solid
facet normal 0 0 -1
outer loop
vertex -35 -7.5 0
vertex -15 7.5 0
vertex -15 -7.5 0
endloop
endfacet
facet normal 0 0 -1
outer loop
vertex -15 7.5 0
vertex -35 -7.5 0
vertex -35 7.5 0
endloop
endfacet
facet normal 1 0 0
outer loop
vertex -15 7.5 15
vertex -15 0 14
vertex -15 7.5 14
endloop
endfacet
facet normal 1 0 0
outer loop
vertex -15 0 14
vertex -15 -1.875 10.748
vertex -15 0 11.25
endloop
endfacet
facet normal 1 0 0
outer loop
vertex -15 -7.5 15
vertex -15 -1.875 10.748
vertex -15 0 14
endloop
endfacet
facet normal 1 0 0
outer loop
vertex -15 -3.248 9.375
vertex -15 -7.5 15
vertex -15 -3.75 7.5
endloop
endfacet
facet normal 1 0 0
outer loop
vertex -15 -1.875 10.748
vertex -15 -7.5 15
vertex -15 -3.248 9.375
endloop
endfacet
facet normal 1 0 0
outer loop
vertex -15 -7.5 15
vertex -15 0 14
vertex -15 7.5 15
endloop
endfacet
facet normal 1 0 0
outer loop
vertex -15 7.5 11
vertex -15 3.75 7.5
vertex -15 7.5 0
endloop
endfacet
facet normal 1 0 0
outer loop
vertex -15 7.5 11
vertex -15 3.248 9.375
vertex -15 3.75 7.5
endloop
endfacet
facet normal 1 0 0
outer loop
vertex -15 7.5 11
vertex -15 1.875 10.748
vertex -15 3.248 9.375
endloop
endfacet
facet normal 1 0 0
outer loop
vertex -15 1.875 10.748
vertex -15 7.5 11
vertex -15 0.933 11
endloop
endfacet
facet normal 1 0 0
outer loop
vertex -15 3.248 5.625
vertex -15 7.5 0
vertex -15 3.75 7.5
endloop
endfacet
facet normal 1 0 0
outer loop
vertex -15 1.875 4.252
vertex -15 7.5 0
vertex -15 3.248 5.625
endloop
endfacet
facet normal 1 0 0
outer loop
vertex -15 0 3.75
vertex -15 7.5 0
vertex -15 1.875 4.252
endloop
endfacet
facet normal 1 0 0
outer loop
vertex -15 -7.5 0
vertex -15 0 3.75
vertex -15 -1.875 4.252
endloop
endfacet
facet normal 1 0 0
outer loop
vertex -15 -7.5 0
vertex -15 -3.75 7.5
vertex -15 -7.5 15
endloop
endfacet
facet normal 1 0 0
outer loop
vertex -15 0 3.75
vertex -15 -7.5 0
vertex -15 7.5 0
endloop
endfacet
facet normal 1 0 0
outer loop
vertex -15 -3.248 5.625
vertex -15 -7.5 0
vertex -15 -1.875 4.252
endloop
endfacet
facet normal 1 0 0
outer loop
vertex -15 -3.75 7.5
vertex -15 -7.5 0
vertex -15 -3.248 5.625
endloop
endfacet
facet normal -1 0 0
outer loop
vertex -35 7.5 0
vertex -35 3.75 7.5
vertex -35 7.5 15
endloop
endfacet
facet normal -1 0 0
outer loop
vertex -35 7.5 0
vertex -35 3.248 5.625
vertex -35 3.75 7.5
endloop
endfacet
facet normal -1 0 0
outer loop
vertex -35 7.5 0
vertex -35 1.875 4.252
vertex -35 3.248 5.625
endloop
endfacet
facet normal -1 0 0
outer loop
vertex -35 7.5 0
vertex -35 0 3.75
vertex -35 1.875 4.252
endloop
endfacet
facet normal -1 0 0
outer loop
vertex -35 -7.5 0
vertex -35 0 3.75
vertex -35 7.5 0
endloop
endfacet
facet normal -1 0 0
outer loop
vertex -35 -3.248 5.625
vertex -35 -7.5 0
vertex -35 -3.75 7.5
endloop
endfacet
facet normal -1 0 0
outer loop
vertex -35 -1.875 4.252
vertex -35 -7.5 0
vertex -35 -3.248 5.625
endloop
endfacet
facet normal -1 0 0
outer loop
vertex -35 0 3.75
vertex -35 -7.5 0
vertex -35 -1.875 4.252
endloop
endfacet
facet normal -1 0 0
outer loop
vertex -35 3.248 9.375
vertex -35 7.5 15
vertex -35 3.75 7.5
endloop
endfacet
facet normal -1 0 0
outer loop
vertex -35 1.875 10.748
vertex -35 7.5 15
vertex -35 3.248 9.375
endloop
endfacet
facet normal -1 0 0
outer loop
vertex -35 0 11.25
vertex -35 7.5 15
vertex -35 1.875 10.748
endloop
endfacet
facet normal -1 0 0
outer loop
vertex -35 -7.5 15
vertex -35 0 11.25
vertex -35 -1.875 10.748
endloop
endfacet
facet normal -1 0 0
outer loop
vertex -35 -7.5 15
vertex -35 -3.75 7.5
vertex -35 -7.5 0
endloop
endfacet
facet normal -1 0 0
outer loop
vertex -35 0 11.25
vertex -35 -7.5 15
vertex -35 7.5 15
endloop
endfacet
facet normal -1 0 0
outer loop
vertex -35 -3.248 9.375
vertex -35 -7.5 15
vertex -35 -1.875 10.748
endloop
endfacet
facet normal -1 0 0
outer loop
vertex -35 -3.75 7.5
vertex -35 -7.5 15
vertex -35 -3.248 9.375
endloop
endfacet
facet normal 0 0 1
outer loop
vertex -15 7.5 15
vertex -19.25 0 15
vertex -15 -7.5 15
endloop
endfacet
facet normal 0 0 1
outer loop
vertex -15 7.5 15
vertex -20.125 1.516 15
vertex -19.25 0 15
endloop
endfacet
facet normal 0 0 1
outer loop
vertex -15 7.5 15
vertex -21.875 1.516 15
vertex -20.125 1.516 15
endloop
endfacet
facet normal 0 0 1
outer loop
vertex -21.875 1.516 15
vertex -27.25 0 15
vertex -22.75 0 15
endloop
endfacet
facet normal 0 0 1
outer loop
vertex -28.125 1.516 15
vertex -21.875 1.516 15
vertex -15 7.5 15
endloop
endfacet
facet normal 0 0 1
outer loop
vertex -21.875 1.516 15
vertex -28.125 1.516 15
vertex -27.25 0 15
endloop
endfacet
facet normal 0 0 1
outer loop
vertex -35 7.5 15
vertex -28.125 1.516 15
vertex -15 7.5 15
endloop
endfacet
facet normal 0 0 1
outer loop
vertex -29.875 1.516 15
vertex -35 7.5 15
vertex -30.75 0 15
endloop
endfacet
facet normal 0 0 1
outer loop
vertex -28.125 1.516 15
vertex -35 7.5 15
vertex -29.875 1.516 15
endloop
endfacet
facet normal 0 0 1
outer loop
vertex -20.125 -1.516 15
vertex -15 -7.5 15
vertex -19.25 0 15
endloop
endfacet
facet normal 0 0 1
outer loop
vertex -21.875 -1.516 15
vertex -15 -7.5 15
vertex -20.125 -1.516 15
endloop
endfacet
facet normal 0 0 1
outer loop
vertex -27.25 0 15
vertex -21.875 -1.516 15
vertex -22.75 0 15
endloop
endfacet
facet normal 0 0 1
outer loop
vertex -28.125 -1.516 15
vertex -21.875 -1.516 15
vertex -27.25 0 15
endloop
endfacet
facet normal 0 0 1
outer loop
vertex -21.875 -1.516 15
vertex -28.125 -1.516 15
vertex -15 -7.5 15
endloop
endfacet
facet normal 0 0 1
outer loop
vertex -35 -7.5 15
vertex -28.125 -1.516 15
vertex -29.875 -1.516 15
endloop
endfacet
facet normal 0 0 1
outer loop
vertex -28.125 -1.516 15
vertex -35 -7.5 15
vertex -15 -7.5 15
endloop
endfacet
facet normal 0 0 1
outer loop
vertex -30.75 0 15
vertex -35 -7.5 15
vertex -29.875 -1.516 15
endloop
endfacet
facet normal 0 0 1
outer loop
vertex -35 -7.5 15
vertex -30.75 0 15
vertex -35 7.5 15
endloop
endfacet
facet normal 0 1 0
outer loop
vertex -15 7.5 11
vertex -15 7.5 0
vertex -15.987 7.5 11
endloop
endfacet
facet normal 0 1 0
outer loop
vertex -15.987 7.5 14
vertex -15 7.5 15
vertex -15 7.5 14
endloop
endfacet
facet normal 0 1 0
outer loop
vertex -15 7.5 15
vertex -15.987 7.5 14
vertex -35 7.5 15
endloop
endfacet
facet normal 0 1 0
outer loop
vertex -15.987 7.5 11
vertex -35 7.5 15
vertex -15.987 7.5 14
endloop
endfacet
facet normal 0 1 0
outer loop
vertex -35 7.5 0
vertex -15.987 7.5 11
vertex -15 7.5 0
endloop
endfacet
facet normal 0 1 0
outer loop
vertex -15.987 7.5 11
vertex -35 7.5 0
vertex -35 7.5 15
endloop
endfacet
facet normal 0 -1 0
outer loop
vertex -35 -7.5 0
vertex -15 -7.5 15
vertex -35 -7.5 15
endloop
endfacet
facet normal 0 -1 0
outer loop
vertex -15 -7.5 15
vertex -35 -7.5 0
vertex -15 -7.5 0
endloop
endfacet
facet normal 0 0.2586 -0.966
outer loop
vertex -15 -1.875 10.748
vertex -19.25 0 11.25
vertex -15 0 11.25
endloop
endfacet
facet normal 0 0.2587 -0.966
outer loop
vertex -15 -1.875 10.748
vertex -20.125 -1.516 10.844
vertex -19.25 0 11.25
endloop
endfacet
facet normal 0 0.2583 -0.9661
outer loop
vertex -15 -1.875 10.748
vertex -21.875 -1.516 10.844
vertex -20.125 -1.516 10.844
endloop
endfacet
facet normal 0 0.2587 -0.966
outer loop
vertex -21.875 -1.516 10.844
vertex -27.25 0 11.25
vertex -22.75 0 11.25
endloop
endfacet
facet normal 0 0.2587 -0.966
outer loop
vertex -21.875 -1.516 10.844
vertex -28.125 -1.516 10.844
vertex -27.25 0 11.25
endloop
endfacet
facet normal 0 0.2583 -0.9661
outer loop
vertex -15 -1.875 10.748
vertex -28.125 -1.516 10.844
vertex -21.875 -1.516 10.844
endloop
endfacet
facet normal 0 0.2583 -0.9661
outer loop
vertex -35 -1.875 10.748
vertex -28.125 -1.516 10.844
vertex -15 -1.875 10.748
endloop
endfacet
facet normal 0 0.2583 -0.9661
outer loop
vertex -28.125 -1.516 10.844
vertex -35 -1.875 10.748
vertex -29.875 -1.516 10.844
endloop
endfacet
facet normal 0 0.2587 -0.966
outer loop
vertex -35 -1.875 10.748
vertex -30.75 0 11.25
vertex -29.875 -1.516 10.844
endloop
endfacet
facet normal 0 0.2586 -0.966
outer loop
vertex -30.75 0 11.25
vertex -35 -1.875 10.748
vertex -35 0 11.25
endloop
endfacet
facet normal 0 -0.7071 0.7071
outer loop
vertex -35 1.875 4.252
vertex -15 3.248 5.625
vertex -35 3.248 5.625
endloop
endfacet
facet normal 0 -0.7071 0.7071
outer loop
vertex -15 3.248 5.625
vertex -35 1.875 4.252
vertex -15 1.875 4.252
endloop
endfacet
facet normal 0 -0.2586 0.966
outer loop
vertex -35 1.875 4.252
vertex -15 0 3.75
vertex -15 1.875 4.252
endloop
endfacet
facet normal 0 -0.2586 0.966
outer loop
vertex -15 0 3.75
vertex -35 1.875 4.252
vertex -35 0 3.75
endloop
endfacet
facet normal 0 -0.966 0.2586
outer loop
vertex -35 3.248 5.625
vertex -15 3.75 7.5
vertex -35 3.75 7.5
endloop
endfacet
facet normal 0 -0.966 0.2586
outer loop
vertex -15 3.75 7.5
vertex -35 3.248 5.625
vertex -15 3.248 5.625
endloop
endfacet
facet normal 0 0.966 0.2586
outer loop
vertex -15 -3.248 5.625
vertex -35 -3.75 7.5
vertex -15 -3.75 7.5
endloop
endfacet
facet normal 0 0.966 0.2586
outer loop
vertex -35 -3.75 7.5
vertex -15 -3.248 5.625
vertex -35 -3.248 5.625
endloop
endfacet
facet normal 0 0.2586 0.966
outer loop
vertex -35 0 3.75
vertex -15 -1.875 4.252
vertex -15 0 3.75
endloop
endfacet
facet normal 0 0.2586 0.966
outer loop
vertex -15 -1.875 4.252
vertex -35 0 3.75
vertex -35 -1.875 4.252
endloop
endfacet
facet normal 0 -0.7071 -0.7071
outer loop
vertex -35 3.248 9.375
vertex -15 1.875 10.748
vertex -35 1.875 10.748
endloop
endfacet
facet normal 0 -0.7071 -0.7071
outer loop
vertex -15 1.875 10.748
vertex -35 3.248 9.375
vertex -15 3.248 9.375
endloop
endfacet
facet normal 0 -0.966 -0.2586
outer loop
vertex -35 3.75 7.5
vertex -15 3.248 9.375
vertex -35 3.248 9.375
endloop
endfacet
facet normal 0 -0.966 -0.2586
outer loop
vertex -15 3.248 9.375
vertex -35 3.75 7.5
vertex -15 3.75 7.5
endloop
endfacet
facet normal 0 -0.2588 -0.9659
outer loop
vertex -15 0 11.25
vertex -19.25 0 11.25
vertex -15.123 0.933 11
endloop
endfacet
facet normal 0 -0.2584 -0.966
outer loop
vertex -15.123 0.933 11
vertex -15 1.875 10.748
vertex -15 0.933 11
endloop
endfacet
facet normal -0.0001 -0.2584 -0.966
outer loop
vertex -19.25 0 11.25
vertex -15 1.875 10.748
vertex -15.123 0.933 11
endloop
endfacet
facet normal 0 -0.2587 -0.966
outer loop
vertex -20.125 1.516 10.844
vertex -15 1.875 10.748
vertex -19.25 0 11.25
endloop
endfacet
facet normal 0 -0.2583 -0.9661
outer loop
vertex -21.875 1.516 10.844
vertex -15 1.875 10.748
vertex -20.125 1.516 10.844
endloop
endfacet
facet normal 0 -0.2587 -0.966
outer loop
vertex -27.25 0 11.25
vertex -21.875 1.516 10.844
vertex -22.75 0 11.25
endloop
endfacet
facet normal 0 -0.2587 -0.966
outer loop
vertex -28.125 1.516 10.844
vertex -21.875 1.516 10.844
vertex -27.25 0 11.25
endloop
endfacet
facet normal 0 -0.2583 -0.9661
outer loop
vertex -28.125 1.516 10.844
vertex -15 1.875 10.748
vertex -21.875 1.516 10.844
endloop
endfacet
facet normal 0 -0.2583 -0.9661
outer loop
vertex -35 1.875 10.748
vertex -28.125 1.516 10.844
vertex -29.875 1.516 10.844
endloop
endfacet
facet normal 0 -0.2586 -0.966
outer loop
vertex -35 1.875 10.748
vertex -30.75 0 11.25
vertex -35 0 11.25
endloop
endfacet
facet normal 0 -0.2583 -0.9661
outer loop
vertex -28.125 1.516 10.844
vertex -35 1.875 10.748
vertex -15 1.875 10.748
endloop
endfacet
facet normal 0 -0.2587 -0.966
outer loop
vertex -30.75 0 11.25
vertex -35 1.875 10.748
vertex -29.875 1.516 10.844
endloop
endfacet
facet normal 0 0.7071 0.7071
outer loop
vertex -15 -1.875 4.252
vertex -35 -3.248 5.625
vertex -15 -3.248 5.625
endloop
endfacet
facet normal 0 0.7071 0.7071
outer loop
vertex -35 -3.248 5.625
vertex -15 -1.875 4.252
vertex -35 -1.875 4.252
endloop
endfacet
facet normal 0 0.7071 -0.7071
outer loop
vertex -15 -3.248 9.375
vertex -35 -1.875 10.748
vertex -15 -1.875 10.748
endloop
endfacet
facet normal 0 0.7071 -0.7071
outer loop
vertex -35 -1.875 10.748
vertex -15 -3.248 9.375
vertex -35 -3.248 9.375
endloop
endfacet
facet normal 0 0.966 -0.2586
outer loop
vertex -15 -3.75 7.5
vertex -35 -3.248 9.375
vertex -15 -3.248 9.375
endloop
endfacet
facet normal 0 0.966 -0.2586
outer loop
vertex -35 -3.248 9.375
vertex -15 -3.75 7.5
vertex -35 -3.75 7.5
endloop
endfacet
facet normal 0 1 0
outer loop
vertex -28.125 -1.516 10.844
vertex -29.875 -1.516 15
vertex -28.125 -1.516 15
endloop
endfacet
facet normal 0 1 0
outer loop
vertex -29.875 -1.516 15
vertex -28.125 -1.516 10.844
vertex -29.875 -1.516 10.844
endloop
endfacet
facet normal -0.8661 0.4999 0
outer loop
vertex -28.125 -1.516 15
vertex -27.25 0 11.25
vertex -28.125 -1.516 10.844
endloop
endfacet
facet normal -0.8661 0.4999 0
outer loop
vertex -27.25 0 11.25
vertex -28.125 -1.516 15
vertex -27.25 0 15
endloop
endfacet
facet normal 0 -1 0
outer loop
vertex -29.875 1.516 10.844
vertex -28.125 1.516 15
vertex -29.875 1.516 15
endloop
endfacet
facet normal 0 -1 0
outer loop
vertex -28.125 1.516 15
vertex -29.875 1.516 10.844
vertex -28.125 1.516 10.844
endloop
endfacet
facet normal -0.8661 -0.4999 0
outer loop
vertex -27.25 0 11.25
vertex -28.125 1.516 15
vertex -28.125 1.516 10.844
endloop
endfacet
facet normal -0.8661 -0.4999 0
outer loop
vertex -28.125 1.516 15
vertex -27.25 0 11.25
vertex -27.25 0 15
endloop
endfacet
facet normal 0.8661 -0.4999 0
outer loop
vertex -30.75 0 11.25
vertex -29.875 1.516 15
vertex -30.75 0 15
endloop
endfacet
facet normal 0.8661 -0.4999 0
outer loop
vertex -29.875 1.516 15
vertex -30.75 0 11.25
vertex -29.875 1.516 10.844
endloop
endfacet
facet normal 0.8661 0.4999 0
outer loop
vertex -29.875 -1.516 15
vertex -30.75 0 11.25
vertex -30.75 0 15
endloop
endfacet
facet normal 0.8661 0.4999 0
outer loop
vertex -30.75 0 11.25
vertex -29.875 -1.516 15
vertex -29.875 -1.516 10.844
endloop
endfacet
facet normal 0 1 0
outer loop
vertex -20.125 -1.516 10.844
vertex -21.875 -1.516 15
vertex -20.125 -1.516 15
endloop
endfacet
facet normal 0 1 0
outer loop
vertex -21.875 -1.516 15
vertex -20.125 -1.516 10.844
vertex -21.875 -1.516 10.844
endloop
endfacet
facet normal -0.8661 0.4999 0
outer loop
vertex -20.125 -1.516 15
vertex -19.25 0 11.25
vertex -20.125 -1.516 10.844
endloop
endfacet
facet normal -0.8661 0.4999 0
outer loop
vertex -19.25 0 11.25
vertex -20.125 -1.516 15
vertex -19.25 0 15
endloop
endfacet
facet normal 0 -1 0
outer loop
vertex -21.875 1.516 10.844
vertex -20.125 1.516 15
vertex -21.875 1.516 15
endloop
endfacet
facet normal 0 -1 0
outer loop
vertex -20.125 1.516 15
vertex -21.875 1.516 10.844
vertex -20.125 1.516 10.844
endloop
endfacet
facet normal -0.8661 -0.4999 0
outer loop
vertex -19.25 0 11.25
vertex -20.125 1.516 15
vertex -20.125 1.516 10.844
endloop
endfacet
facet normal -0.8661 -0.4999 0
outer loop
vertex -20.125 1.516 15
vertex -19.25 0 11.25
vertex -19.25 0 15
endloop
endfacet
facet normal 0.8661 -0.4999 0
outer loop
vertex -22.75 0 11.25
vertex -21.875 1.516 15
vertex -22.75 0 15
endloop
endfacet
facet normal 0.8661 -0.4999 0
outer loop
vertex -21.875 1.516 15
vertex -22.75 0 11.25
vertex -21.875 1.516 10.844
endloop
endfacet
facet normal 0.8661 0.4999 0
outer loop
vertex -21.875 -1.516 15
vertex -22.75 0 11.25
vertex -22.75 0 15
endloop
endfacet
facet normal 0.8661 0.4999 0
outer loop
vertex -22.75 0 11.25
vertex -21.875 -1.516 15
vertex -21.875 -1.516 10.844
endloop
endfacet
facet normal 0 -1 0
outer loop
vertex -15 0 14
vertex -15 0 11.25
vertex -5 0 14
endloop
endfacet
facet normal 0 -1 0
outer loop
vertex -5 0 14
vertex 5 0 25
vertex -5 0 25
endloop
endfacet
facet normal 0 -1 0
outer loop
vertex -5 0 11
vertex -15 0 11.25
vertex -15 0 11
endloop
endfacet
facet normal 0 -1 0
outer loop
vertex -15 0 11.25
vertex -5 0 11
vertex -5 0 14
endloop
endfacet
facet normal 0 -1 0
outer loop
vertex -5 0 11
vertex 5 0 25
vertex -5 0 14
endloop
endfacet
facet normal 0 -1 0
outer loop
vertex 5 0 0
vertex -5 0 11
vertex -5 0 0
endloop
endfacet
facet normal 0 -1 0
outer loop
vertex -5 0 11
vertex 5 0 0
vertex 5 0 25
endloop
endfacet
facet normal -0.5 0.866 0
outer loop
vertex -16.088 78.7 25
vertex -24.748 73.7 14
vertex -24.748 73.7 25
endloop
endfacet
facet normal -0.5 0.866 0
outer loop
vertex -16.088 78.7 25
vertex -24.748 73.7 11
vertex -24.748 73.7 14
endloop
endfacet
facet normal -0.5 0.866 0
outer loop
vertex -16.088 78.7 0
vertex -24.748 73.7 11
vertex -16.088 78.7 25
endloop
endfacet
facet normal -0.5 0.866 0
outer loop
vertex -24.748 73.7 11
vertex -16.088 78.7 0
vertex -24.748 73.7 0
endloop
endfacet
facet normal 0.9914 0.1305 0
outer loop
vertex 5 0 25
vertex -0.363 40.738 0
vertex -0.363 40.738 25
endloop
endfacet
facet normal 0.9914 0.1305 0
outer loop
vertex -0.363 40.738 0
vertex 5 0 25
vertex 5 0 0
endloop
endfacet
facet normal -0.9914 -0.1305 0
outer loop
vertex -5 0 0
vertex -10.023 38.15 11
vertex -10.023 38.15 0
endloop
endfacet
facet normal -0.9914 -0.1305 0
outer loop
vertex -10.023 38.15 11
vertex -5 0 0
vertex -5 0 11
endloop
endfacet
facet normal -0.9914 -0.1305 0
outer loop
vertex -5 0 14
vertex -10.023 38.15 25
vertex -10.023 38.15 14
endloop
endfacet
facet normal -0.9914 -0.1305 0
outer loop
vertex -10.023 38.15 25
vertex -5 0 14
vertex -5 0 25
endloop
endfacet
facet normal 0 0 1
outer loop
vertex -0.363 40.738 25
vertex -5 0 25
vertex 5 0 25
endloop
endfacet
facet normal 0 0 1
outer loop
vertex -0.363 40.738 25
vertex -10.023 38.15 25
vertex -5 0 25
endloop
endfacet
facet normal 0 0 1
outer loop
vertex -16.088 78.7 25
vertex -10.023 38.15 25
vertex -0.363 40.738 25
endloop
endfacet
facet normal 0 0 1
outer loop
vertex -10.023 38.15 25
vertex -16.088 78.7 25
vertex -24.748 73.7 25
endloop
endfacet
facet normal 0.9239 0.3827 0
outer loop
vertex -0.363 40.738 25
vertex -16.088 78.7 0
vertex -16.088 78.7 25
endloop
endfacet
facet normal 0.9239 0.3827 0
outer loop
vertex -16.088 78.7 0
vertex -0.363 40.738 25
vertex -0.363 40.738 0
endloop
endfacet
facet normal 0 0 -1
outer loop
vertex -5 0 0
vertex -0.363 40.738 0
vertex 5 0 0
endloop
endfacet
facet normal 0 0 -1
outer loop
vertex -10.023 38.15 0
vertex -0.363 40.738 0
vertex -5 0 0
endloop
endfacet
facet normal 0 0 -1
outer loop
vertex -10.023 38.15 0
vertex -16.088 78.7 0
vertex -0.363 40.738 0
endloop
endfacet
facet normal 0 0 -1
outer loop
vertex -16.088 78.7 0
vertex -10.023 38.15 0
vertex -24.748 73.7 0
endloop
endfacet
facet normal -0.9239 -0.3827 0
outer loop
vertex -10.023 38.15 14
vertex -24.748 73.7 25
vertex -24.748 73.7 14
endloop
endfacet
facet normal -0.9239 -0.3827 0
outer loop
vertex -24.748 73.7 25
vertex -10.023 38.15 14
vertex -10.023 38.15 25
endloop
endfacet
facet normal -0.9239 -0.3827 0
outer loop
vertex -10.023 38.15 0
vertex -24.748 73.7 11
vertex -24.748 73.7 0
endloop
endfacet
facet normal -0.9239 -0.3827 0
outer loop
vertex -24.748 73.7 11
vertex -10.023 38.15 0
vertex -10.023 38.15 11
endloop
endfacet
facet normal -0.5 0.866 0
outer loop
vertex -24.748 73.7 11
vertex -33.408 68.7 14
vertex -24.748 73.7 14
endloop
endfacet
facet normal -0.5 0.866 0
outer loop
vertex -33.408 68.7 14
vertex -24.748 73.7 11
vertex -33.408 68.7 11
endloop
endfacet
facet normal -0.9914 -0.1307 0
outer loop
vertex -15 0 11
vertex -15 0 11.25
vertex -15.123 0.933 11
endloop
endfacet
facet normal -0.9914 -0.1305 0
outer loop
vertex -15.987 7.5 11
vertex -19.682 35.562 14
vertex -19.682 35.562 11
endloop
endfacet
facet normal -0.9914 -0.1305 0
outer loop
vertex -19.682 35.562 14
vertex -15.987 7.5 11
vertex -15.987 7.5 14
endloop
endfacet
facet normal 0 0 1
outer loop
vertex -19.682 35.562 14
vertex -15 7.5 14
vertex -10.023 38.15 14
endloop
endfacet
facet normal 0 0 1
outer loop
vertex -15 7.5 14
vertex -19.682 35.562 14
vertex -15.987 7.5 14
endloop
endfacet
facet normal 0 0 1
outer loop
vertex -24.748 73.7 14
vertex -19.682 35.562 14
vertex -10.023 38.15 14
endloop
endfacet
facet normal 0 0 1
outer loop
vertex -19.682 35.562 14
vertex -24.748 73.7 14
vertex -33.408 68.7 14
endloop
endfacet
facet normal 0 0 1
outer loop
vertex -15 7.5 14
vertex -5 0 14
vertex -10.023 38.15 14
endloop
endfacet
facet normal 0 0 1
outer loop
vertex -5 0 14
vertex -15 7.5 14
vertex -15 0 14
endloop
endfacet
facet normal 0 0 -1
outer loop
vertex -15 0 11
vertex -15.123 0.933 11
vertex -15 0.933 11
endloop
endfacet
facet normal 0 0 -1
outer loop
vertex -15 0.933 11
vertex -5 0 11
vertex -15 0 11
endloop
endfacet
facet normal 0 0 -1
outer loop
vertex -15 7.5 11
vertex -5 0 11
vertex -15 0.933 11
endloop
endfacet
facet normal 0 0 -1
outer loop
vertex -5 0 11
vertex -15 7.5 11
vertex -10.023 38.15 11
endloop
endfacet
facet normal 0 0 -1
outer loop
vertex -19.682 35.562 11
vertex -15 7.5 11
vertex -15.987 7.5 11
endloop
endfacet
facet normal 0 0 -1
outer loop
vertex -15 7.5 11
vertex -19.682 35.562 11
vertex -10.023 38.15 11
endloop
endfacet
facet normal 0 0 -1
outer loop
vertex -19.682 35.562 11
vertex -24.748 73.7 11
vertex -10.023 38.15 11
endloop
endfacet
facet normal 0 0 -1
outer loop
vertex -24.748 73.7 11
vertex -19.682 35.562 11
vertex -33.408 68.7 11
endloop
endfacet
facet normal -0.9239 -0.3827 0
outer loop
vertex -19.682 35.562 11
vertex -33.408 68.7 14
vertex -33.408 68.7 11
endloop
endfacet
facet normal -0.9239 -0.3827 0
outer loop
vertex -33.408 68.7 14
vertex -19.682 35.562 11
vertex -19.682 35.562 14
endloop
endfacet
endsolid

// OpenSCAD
union() {
	translate(v = [-152.4000000000, 0, 0]) {
		translate(v = [0, 0, 12.5000000000]) {
			rotate_extrude(angle = 30) {
				translate(v = [152.4000000000, 0, 0]) {
					square(center = true, size = [10, 25]);
				}
			}
		}
	}
	translate(v = [-152.4000000000, 0, 0]) {
		translate(v = [0, 0, 12.5000000000]) {
			rotate_extrude(angle = 30) {
				translate(v = [142.4000000000, 0, 0]) {
					square(center = true, size = [10, 3]);
				}
			}
		}
	}
	translate(v = [0, 0, 7.5000000000]) {
		translate(v = [-25, 0, 0]) {
			difference() {
				rotate(a = [0, 90, 0]) {
					difference() {
						cube(center = true, size = [15, 15, 20]);
						translate(v = [0, 0, -20]) {
							cylinder(d = 7.5000000000, h = 40);
						}
					}
				}
				translate(v = [-4, 0, 0]) {
					cylinder(d = 3.5000000000, h = 10);
				}
				translate(v = [4, 0, 0]) {
					cylinder(d = 3.5000000000, h = 10);
				}
			}
		}
	}
}
